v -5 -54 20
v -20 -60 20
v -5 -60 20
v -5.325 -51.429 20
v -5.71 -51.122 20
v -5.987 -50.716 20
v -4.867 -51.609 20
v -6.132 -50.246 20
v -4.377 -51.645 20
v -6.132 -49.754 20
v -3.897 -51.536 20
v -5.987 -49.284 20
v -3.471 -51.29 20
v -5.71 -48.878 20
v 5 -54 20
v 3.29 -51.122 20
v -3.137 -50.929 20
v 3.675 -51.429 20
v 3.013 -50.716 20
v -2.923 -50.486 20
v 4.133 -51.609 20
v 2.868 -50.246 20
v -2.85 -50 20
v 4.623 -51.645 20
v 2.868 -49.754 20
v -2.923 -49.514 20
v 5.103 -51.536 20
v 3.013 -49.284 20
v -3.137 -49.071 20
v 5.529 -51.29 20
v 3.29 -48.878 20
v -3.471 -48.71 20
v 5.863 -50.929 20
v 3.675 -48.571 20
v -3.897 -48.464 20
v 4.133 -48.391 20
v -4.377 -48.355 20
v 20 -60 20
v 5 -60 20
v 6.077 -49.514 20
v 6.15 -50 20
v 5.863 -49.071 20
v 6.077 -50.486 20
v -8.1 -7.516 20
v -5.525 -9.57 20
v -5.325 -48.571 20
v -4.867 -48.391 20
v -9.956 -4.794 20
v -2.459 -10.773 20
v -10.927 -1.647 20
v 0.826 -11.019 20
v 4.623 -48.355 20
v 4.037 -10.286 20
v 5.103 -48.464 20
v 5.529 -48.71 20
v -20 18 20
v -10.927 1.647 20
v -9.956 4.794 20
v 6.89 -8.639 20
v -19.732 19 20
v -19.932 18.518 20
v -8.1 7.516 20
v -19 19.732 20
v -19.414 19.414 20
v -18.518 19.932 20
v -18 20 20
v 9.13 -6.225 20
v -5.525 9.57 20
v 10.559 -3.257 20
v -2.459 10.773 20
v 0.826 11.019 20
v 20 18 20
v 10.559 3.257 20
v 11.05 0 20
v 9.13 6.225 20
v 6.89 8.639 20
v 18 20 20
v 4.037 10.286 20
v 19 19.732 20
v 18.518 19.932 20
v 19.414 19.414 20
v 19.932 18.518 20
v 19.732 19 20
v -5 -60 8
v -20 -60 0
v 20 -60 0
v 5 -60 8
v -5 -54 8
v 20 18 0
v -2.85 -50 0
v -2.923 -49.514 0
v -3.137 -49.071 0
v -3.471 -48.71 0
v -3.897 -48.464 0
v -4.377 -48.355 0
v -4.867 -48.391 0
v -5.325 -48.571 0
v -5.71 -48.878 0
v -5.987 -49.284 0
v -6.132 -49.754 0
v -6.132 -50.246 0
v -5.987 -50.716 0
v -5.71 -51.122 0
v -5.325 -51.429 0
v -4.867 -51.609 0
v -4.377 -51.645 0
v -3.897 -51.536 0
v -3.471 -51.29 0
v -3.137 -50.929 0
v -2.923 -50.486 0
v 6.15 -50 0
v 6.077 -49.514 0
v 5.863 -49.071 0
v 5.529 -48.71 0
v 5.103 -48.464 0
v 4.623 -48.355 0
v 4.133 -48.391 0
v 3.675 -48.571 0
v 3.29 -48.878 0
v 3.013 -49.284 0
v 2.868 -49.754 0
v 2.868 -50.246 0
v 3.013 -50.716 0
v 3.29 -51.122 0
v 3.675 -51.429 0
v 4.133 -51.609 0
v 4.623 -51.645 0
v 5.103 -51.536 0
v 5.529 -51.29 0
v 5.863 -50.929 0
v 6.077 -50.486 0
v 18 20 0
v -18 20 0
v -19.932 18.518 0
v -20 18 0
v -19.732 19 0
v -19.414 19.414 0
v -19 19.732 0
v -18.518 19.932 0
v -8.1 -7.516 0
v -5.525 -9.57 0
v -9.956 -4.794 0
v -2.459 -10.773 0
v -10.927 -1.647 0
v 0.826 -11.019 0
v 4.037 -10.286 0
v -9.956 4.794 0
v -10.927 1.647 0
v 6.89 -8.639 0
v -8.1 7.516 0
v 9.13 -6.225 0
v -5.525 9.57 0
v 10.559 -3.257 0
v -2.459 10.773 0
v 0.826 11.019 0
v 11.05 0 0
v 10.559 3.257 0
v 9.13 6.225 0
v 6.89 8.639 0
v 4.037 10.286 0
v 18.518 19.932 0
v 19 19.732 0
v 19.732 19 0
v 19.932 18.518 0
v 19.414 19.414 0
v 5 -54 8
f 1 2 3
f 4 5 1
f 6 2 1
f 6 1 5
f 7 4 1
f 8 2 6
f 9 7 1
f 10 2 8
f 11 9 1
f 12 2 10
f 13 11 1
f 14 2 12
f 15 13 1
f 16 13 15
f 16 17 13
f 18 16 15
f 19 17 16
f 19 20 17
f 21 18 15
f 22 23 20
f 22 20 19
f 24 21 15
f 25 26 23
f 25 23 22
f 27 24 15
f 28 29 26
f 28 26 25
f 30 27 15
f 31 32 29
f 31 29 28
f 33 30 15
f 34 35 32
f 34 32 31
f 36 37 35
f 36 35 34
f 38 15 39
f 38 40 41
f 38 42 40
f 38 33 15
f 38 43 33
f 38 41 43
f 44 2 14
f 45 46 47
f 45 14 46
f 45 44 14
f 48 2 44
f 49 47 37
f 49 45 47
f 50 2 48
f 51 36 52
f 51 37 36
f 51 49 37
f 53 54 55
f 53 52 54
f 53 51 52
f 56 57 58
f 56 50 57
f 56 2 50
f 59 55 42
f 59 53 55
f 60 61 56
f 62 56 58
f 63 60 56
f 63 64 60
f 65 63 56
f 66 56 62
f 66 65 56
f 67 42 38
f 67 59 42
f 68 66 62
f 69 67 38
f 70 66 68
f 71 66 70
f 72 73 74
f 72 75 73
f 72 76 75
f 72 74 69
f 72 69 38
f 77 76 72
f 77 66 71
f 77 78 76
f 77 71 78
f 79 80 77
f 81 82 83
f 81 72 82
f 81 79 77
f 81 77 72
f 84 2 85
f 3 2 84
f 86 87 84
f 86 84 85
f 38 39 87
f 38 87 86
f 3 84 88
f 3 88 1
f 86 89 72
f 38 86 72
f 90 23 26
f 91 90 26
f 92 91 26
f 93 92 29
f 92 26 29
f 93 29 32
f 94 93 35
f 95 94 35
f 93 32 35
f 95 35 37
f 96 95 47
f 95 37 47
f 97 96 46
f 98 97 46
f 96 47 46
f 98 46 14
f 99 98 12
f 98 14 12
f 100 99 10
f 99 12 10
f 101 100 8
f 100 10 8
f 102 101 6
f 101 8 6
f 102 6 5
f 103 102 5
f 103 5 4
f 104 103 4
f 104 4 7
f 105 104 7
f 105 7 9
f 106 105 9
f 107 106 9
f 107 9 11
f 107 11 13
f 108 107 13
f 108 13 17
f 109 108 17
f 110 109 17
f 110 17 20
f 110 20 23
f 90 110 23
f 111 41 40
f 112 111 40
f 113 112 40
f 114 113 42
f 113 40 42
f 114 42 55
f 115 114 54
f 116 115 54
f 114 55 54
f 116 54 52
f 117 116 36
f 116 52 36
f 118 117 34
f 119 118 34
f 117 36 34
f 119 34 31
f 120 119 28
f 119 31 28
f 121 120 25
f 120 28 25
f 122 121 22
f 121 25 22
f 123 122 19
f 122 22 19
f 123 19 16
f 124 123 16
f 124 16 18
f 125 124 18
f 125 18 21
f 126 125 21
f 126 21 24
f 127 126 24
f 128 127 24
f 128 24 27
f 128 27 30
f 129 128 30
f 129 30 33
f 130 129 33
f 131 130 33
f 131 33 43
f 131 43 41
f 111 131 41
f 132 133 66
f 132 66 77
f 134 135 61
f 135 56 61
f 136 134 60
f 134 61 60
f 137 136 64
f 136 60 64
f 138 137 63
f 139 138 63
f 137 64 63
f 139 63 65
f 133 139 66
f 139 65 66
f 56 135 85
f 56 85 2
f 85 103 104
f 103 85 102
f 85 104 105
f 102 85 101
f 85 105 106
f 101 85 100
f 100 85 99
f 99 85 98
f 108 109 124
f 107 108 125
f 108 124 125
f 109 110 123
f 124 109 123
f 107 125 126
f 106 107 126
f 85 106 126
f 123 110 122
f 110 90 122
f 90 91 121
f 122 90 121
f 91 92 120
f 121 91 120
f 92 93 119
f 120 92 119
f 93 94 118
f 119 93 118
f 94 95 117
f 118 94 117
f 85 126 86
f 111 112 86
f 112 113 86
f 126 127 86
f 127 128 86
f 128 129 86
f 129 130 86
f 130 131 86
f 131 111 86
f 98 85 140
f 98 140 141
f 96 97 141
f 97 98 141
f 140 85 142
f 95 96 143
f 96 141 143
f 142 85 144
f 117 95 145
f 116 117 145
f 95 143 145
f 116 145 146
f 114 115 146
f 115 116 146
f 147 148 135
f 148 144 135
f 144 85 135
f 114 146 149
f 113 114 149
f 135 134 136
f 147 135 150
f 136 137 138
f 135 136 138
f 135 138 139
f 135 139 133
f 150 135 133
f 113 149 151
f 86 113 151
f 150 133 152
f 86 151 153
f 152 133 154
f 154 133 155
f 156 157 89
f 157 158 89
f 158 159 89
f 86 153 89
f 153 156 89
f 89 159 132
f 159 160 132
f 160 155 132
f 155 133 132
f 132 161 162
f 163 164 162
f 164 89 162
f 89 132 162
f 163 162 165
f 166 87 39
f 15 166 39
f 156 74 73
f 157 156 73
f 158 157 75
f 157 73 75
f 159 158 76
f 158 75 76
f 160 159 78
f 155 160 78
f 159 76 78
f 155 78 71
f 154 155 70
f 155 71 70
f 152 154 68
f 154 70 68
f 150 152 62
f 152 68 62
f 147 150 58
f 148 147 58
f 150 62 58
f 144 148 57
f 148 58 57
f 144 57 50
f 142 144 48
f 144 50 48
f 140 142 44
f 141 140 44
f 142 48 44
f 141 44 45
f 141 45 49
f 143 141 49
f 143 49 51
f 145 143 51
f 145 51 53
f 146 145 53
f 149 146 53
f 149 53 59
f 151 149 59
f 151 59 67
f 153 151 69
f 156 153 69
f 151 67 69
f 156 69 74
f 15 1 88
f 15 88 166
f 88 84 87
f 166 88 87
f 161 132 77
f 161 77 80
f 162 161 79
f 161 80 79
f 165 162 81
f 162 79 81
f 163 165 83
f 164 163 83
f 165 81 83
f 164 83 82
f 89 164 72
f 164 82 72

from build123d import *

# Parameters (mm, degrees)
SKETCH_1_W          = 40
SKETCH_1_H          = 40
EXTRUDE_1_DEPTH     = 20
SKETCH_2_R          = 11.05
CUT_EXTRUDE_1_DEPTH = 20
SKETCH_3_W          = 40
SKETCH_3_H          = 20
EXTRUDE_2_DEPTH     = 40
SKETCH_4_R          = 1.65
CUT_EXTRUDE_2_DEPTH = 40
SKETCH_5_W          = 10
SKETCH_5_H          = 12
CUT_EXTRUDE_3_DEPTH = 6
FILLET_1_R          = 2


with BuildPart() as part:
    # 草图1 → 凸台-拉伸1 (new body)
    with BuildSketch(Plane.XY):
        Rectangle(SKETCH_1_W, SKETCH_1_H)
    extrude(amount=EXTRUDE_1_DEPTH)

    # 草图2 → 切除-拉伸1 (cut)
    with BuildSketch(Plane.XY.offset(20)):
        Circle(SKETCH_2_R)
    extrude(amount=-CUT_EXTRUDE_1_DEPTH, mode=Mode.SUBTRACT)

    # 草图3 → 凸台-拉伸2 (add)
    with BuildSketch(Plane.XZ.offset(20)):
        with Locations((0, 10)):
            Rectangle(SKETCH_3_W, SKETCH_3_H)
    extrude(amount=EXTRUDE_2_DEPTH)

    # 草图4 → 切除-拉伸2 (cut)
    with BuildSketch(Plane.XY.offset(20)):
        with Locations((4.5, -50)):
            Circle(SKETCH_4_R)
        with Locations((-4.5, -50)):
            Circle(SKETCH_4_R)
    extrude(amount=-CUT_EXTRUDE_2_DEPTH, mode=Mode.SUBTRACT)

    # 草图5 → 切除-拉伸3 (cut)
    with BuildSketch(Plane.XZ.offset(60)):
        with Locations((0, 14)):
            Rectangle(SKETCH_5_W, SKETCH_5_H)
    extrude(amount=-CUT_EXTRUDE_3_DEPTH, mode=Mode.SUBTRACT)

    # 圆角1
    fillet_1_edges = [part.edges().sort_by_distance(p)[0] for p in [
        (-20, 20, 10),
        (20, 20, 10),
    ]]
    fillet(fillet_1_edges, radius=FILLET_1_R)


solid = part.part
